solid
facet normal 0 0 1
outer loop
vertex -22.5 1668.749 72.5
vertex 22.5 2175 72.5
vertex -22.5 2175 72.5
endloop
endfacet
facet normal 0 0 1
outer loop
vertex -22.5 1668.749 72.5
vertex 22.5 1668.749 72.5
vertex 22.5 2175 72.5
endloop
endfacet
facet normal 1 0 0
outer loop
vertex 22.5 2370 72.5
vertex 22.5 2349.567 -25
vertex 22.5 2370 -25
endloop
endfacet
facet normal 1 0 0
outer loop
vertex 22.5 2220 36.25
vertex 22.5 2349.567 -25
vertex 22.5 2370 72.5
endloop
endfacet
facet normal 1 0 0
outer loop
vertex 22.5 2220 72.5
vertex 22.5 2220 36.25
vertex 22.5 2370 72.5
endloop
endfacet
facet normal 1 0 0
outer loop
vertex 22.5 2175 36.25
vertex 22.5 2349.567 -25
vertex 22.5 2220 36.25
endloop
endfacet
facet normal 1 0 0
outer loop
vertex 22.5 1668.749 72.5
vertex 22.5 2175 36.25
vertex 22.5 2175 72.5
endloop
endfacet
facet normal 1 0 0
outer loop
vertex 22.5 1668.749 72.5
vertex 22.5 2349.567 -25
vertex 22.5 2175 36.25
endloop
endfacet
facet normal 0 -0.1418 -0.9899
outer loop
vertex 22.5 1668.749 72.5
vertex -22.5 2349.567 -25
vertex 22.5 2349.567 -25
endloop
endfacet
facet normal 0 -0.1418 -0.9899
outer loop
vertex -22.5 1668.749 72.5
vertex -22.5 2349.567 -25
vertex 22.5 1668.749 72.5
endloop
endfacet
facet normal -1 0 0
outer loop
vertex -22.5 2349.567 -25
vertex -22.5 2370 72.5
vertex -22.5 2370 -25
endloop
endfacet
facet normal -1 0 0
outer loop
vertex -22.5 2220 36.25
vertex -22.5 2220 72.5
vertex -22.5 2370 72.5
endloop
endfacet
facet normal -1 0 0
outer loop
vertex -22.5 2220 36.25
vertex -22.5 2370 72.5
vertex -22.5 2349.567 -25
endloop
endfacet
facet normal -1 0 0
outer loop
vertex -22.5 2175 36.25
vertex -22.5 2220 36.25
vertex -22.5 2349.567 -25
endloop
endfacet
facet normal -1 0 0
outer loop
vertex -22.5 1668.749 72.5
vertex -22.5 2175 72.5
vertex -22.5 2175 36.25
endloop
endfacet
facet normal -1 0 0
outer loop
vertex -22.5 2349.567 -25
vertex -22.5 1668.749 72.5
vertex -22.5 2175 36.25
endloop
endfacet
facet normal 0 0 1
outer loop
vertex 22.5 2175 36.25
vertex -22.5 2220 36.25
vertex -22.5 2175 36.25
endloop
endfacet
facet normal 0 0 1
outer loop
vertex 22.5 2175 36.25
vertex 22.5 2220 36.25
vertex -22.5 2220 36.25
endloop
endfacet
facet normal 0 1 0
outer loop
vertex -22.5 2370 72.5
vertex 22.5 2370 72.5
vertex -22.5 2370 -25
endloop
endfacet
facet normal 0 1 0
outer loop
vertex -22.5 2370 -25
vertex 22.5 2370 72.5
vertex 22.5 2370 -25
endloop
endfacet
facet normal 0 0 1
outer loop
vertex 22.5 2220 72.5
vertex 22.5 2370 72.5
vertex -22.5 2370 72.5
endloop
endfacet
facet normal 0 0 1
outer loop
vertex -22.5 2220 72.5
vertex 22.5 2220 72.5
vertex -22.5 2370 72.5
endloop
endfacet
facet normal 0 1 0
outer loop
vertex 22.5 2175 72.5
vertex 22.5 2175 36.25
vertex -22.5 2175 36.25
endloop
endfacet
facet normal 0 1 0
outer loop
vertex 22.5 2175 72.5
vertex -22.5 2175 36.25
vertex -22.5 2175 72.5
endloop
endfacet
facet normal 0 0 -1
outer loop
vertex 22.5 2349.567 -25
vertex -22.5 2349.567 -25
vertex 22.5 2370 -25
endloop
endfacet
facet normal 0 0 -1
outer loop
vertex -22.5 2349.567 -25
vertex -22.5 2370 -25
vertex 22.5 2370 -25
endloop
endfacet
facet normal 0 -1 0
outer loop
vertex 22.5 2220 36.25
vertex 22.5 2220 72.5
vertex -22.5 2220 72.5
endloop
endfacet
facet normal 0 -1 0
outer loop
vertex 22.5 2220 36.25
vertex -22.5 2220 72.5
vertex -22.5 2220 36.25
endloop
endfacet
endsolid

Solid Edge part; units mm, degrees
sketch "Sketch1" plane through (0, 0, 0) normal (0, -1, 0) x (1, 0, 0)
  line L0 (-22.5, -72.5) -> (22.5, -72.5)
  line L1 (22.5, -72.5) -> (22.5, 72.5)
  line L2 (22.5, 72.5) -> (-22.5, 72.5)
  line L3 (-22.5, 72.5) -> (-22.5, -72.5)
extrude "Protrusion1" add sketch "Sketch1" against normal blind 2370
sketch "Sketch2" plane through (22.5, 1185, 0) normal (1, 0, 0) x (0, 1, 0)
  line L0 (1035, 72.5) -> (1035, 36.25)
  line L1 (1035, 36.25) -> (990, 36.25)
  line L2 (990, 36.25) -> (990, 72.5)
  line L3 (990, 72.5) -> (1035, 72.5)
  line L4 (-1035, 72.5) -> (-1035, 36.25)
  line L5 (-1035, 36.25) -> (-990, 36.25)
  line L6 (-990, 36.25) -> (-990, 72.5)
  line L7 (-990, 72.5) -> (-1035, 72.5)
extrude "ExtrudedCutout_1" cut sketch "Sketch2" against normal blind 89.2118
sketch "Sketch3" plane through (22.5, 1185, 0) normal (1, 0, 0) x (0, 1, 0)
  line L0 (-1185, -72.5) -> (1185, -72.5)
  line L1 (1185, -72.5) -> (1185, 0)
  line L2 (1185, 0) -> (-1185, 0)
  line L3 (-1185, 0) -> (-1185, -72.5)
extrude "ExtrudedCutout_2" cut sketch "Sketch3" against normal blind 236.7564
sketch "Sketch4" plane through (0, 1185, 0) normal (0, 0, -1) x (0, -1, 0)
  line L0 (-1185, 22.5) -> (1185, 22.5)
  line L1 (1185, 22.5) -> (1185, -22.5)
  line L2 (1185, -22.5) -> (-1185, -22.5)
  line L3 (-1185, -22.5) -> (-1185, 22.5)
extrude "ExtrudedProtrusion_2" add sketch "Sketch4" along normal blind 25
sketch "Sketch5" plane through (-22.5, 1185, 23.75) normal (-1, 0, 0) x (0, 1, 0)
  line L0 (-1185, -287.7315) -> (-1185, 76.8245)
  line L1 (-1185, 76.8245) -> (1185, 76.8245)
  line L2 (1185, 76.8245) -> (1185, 51.6762)
  line L3 (1185, 51.6762) -> (-1185, -287.7315)
extrude "ExtrudedCutout_5" cut sketch "Sketch5" against normal blind 75.1515
properties material "Wood, Pine"
